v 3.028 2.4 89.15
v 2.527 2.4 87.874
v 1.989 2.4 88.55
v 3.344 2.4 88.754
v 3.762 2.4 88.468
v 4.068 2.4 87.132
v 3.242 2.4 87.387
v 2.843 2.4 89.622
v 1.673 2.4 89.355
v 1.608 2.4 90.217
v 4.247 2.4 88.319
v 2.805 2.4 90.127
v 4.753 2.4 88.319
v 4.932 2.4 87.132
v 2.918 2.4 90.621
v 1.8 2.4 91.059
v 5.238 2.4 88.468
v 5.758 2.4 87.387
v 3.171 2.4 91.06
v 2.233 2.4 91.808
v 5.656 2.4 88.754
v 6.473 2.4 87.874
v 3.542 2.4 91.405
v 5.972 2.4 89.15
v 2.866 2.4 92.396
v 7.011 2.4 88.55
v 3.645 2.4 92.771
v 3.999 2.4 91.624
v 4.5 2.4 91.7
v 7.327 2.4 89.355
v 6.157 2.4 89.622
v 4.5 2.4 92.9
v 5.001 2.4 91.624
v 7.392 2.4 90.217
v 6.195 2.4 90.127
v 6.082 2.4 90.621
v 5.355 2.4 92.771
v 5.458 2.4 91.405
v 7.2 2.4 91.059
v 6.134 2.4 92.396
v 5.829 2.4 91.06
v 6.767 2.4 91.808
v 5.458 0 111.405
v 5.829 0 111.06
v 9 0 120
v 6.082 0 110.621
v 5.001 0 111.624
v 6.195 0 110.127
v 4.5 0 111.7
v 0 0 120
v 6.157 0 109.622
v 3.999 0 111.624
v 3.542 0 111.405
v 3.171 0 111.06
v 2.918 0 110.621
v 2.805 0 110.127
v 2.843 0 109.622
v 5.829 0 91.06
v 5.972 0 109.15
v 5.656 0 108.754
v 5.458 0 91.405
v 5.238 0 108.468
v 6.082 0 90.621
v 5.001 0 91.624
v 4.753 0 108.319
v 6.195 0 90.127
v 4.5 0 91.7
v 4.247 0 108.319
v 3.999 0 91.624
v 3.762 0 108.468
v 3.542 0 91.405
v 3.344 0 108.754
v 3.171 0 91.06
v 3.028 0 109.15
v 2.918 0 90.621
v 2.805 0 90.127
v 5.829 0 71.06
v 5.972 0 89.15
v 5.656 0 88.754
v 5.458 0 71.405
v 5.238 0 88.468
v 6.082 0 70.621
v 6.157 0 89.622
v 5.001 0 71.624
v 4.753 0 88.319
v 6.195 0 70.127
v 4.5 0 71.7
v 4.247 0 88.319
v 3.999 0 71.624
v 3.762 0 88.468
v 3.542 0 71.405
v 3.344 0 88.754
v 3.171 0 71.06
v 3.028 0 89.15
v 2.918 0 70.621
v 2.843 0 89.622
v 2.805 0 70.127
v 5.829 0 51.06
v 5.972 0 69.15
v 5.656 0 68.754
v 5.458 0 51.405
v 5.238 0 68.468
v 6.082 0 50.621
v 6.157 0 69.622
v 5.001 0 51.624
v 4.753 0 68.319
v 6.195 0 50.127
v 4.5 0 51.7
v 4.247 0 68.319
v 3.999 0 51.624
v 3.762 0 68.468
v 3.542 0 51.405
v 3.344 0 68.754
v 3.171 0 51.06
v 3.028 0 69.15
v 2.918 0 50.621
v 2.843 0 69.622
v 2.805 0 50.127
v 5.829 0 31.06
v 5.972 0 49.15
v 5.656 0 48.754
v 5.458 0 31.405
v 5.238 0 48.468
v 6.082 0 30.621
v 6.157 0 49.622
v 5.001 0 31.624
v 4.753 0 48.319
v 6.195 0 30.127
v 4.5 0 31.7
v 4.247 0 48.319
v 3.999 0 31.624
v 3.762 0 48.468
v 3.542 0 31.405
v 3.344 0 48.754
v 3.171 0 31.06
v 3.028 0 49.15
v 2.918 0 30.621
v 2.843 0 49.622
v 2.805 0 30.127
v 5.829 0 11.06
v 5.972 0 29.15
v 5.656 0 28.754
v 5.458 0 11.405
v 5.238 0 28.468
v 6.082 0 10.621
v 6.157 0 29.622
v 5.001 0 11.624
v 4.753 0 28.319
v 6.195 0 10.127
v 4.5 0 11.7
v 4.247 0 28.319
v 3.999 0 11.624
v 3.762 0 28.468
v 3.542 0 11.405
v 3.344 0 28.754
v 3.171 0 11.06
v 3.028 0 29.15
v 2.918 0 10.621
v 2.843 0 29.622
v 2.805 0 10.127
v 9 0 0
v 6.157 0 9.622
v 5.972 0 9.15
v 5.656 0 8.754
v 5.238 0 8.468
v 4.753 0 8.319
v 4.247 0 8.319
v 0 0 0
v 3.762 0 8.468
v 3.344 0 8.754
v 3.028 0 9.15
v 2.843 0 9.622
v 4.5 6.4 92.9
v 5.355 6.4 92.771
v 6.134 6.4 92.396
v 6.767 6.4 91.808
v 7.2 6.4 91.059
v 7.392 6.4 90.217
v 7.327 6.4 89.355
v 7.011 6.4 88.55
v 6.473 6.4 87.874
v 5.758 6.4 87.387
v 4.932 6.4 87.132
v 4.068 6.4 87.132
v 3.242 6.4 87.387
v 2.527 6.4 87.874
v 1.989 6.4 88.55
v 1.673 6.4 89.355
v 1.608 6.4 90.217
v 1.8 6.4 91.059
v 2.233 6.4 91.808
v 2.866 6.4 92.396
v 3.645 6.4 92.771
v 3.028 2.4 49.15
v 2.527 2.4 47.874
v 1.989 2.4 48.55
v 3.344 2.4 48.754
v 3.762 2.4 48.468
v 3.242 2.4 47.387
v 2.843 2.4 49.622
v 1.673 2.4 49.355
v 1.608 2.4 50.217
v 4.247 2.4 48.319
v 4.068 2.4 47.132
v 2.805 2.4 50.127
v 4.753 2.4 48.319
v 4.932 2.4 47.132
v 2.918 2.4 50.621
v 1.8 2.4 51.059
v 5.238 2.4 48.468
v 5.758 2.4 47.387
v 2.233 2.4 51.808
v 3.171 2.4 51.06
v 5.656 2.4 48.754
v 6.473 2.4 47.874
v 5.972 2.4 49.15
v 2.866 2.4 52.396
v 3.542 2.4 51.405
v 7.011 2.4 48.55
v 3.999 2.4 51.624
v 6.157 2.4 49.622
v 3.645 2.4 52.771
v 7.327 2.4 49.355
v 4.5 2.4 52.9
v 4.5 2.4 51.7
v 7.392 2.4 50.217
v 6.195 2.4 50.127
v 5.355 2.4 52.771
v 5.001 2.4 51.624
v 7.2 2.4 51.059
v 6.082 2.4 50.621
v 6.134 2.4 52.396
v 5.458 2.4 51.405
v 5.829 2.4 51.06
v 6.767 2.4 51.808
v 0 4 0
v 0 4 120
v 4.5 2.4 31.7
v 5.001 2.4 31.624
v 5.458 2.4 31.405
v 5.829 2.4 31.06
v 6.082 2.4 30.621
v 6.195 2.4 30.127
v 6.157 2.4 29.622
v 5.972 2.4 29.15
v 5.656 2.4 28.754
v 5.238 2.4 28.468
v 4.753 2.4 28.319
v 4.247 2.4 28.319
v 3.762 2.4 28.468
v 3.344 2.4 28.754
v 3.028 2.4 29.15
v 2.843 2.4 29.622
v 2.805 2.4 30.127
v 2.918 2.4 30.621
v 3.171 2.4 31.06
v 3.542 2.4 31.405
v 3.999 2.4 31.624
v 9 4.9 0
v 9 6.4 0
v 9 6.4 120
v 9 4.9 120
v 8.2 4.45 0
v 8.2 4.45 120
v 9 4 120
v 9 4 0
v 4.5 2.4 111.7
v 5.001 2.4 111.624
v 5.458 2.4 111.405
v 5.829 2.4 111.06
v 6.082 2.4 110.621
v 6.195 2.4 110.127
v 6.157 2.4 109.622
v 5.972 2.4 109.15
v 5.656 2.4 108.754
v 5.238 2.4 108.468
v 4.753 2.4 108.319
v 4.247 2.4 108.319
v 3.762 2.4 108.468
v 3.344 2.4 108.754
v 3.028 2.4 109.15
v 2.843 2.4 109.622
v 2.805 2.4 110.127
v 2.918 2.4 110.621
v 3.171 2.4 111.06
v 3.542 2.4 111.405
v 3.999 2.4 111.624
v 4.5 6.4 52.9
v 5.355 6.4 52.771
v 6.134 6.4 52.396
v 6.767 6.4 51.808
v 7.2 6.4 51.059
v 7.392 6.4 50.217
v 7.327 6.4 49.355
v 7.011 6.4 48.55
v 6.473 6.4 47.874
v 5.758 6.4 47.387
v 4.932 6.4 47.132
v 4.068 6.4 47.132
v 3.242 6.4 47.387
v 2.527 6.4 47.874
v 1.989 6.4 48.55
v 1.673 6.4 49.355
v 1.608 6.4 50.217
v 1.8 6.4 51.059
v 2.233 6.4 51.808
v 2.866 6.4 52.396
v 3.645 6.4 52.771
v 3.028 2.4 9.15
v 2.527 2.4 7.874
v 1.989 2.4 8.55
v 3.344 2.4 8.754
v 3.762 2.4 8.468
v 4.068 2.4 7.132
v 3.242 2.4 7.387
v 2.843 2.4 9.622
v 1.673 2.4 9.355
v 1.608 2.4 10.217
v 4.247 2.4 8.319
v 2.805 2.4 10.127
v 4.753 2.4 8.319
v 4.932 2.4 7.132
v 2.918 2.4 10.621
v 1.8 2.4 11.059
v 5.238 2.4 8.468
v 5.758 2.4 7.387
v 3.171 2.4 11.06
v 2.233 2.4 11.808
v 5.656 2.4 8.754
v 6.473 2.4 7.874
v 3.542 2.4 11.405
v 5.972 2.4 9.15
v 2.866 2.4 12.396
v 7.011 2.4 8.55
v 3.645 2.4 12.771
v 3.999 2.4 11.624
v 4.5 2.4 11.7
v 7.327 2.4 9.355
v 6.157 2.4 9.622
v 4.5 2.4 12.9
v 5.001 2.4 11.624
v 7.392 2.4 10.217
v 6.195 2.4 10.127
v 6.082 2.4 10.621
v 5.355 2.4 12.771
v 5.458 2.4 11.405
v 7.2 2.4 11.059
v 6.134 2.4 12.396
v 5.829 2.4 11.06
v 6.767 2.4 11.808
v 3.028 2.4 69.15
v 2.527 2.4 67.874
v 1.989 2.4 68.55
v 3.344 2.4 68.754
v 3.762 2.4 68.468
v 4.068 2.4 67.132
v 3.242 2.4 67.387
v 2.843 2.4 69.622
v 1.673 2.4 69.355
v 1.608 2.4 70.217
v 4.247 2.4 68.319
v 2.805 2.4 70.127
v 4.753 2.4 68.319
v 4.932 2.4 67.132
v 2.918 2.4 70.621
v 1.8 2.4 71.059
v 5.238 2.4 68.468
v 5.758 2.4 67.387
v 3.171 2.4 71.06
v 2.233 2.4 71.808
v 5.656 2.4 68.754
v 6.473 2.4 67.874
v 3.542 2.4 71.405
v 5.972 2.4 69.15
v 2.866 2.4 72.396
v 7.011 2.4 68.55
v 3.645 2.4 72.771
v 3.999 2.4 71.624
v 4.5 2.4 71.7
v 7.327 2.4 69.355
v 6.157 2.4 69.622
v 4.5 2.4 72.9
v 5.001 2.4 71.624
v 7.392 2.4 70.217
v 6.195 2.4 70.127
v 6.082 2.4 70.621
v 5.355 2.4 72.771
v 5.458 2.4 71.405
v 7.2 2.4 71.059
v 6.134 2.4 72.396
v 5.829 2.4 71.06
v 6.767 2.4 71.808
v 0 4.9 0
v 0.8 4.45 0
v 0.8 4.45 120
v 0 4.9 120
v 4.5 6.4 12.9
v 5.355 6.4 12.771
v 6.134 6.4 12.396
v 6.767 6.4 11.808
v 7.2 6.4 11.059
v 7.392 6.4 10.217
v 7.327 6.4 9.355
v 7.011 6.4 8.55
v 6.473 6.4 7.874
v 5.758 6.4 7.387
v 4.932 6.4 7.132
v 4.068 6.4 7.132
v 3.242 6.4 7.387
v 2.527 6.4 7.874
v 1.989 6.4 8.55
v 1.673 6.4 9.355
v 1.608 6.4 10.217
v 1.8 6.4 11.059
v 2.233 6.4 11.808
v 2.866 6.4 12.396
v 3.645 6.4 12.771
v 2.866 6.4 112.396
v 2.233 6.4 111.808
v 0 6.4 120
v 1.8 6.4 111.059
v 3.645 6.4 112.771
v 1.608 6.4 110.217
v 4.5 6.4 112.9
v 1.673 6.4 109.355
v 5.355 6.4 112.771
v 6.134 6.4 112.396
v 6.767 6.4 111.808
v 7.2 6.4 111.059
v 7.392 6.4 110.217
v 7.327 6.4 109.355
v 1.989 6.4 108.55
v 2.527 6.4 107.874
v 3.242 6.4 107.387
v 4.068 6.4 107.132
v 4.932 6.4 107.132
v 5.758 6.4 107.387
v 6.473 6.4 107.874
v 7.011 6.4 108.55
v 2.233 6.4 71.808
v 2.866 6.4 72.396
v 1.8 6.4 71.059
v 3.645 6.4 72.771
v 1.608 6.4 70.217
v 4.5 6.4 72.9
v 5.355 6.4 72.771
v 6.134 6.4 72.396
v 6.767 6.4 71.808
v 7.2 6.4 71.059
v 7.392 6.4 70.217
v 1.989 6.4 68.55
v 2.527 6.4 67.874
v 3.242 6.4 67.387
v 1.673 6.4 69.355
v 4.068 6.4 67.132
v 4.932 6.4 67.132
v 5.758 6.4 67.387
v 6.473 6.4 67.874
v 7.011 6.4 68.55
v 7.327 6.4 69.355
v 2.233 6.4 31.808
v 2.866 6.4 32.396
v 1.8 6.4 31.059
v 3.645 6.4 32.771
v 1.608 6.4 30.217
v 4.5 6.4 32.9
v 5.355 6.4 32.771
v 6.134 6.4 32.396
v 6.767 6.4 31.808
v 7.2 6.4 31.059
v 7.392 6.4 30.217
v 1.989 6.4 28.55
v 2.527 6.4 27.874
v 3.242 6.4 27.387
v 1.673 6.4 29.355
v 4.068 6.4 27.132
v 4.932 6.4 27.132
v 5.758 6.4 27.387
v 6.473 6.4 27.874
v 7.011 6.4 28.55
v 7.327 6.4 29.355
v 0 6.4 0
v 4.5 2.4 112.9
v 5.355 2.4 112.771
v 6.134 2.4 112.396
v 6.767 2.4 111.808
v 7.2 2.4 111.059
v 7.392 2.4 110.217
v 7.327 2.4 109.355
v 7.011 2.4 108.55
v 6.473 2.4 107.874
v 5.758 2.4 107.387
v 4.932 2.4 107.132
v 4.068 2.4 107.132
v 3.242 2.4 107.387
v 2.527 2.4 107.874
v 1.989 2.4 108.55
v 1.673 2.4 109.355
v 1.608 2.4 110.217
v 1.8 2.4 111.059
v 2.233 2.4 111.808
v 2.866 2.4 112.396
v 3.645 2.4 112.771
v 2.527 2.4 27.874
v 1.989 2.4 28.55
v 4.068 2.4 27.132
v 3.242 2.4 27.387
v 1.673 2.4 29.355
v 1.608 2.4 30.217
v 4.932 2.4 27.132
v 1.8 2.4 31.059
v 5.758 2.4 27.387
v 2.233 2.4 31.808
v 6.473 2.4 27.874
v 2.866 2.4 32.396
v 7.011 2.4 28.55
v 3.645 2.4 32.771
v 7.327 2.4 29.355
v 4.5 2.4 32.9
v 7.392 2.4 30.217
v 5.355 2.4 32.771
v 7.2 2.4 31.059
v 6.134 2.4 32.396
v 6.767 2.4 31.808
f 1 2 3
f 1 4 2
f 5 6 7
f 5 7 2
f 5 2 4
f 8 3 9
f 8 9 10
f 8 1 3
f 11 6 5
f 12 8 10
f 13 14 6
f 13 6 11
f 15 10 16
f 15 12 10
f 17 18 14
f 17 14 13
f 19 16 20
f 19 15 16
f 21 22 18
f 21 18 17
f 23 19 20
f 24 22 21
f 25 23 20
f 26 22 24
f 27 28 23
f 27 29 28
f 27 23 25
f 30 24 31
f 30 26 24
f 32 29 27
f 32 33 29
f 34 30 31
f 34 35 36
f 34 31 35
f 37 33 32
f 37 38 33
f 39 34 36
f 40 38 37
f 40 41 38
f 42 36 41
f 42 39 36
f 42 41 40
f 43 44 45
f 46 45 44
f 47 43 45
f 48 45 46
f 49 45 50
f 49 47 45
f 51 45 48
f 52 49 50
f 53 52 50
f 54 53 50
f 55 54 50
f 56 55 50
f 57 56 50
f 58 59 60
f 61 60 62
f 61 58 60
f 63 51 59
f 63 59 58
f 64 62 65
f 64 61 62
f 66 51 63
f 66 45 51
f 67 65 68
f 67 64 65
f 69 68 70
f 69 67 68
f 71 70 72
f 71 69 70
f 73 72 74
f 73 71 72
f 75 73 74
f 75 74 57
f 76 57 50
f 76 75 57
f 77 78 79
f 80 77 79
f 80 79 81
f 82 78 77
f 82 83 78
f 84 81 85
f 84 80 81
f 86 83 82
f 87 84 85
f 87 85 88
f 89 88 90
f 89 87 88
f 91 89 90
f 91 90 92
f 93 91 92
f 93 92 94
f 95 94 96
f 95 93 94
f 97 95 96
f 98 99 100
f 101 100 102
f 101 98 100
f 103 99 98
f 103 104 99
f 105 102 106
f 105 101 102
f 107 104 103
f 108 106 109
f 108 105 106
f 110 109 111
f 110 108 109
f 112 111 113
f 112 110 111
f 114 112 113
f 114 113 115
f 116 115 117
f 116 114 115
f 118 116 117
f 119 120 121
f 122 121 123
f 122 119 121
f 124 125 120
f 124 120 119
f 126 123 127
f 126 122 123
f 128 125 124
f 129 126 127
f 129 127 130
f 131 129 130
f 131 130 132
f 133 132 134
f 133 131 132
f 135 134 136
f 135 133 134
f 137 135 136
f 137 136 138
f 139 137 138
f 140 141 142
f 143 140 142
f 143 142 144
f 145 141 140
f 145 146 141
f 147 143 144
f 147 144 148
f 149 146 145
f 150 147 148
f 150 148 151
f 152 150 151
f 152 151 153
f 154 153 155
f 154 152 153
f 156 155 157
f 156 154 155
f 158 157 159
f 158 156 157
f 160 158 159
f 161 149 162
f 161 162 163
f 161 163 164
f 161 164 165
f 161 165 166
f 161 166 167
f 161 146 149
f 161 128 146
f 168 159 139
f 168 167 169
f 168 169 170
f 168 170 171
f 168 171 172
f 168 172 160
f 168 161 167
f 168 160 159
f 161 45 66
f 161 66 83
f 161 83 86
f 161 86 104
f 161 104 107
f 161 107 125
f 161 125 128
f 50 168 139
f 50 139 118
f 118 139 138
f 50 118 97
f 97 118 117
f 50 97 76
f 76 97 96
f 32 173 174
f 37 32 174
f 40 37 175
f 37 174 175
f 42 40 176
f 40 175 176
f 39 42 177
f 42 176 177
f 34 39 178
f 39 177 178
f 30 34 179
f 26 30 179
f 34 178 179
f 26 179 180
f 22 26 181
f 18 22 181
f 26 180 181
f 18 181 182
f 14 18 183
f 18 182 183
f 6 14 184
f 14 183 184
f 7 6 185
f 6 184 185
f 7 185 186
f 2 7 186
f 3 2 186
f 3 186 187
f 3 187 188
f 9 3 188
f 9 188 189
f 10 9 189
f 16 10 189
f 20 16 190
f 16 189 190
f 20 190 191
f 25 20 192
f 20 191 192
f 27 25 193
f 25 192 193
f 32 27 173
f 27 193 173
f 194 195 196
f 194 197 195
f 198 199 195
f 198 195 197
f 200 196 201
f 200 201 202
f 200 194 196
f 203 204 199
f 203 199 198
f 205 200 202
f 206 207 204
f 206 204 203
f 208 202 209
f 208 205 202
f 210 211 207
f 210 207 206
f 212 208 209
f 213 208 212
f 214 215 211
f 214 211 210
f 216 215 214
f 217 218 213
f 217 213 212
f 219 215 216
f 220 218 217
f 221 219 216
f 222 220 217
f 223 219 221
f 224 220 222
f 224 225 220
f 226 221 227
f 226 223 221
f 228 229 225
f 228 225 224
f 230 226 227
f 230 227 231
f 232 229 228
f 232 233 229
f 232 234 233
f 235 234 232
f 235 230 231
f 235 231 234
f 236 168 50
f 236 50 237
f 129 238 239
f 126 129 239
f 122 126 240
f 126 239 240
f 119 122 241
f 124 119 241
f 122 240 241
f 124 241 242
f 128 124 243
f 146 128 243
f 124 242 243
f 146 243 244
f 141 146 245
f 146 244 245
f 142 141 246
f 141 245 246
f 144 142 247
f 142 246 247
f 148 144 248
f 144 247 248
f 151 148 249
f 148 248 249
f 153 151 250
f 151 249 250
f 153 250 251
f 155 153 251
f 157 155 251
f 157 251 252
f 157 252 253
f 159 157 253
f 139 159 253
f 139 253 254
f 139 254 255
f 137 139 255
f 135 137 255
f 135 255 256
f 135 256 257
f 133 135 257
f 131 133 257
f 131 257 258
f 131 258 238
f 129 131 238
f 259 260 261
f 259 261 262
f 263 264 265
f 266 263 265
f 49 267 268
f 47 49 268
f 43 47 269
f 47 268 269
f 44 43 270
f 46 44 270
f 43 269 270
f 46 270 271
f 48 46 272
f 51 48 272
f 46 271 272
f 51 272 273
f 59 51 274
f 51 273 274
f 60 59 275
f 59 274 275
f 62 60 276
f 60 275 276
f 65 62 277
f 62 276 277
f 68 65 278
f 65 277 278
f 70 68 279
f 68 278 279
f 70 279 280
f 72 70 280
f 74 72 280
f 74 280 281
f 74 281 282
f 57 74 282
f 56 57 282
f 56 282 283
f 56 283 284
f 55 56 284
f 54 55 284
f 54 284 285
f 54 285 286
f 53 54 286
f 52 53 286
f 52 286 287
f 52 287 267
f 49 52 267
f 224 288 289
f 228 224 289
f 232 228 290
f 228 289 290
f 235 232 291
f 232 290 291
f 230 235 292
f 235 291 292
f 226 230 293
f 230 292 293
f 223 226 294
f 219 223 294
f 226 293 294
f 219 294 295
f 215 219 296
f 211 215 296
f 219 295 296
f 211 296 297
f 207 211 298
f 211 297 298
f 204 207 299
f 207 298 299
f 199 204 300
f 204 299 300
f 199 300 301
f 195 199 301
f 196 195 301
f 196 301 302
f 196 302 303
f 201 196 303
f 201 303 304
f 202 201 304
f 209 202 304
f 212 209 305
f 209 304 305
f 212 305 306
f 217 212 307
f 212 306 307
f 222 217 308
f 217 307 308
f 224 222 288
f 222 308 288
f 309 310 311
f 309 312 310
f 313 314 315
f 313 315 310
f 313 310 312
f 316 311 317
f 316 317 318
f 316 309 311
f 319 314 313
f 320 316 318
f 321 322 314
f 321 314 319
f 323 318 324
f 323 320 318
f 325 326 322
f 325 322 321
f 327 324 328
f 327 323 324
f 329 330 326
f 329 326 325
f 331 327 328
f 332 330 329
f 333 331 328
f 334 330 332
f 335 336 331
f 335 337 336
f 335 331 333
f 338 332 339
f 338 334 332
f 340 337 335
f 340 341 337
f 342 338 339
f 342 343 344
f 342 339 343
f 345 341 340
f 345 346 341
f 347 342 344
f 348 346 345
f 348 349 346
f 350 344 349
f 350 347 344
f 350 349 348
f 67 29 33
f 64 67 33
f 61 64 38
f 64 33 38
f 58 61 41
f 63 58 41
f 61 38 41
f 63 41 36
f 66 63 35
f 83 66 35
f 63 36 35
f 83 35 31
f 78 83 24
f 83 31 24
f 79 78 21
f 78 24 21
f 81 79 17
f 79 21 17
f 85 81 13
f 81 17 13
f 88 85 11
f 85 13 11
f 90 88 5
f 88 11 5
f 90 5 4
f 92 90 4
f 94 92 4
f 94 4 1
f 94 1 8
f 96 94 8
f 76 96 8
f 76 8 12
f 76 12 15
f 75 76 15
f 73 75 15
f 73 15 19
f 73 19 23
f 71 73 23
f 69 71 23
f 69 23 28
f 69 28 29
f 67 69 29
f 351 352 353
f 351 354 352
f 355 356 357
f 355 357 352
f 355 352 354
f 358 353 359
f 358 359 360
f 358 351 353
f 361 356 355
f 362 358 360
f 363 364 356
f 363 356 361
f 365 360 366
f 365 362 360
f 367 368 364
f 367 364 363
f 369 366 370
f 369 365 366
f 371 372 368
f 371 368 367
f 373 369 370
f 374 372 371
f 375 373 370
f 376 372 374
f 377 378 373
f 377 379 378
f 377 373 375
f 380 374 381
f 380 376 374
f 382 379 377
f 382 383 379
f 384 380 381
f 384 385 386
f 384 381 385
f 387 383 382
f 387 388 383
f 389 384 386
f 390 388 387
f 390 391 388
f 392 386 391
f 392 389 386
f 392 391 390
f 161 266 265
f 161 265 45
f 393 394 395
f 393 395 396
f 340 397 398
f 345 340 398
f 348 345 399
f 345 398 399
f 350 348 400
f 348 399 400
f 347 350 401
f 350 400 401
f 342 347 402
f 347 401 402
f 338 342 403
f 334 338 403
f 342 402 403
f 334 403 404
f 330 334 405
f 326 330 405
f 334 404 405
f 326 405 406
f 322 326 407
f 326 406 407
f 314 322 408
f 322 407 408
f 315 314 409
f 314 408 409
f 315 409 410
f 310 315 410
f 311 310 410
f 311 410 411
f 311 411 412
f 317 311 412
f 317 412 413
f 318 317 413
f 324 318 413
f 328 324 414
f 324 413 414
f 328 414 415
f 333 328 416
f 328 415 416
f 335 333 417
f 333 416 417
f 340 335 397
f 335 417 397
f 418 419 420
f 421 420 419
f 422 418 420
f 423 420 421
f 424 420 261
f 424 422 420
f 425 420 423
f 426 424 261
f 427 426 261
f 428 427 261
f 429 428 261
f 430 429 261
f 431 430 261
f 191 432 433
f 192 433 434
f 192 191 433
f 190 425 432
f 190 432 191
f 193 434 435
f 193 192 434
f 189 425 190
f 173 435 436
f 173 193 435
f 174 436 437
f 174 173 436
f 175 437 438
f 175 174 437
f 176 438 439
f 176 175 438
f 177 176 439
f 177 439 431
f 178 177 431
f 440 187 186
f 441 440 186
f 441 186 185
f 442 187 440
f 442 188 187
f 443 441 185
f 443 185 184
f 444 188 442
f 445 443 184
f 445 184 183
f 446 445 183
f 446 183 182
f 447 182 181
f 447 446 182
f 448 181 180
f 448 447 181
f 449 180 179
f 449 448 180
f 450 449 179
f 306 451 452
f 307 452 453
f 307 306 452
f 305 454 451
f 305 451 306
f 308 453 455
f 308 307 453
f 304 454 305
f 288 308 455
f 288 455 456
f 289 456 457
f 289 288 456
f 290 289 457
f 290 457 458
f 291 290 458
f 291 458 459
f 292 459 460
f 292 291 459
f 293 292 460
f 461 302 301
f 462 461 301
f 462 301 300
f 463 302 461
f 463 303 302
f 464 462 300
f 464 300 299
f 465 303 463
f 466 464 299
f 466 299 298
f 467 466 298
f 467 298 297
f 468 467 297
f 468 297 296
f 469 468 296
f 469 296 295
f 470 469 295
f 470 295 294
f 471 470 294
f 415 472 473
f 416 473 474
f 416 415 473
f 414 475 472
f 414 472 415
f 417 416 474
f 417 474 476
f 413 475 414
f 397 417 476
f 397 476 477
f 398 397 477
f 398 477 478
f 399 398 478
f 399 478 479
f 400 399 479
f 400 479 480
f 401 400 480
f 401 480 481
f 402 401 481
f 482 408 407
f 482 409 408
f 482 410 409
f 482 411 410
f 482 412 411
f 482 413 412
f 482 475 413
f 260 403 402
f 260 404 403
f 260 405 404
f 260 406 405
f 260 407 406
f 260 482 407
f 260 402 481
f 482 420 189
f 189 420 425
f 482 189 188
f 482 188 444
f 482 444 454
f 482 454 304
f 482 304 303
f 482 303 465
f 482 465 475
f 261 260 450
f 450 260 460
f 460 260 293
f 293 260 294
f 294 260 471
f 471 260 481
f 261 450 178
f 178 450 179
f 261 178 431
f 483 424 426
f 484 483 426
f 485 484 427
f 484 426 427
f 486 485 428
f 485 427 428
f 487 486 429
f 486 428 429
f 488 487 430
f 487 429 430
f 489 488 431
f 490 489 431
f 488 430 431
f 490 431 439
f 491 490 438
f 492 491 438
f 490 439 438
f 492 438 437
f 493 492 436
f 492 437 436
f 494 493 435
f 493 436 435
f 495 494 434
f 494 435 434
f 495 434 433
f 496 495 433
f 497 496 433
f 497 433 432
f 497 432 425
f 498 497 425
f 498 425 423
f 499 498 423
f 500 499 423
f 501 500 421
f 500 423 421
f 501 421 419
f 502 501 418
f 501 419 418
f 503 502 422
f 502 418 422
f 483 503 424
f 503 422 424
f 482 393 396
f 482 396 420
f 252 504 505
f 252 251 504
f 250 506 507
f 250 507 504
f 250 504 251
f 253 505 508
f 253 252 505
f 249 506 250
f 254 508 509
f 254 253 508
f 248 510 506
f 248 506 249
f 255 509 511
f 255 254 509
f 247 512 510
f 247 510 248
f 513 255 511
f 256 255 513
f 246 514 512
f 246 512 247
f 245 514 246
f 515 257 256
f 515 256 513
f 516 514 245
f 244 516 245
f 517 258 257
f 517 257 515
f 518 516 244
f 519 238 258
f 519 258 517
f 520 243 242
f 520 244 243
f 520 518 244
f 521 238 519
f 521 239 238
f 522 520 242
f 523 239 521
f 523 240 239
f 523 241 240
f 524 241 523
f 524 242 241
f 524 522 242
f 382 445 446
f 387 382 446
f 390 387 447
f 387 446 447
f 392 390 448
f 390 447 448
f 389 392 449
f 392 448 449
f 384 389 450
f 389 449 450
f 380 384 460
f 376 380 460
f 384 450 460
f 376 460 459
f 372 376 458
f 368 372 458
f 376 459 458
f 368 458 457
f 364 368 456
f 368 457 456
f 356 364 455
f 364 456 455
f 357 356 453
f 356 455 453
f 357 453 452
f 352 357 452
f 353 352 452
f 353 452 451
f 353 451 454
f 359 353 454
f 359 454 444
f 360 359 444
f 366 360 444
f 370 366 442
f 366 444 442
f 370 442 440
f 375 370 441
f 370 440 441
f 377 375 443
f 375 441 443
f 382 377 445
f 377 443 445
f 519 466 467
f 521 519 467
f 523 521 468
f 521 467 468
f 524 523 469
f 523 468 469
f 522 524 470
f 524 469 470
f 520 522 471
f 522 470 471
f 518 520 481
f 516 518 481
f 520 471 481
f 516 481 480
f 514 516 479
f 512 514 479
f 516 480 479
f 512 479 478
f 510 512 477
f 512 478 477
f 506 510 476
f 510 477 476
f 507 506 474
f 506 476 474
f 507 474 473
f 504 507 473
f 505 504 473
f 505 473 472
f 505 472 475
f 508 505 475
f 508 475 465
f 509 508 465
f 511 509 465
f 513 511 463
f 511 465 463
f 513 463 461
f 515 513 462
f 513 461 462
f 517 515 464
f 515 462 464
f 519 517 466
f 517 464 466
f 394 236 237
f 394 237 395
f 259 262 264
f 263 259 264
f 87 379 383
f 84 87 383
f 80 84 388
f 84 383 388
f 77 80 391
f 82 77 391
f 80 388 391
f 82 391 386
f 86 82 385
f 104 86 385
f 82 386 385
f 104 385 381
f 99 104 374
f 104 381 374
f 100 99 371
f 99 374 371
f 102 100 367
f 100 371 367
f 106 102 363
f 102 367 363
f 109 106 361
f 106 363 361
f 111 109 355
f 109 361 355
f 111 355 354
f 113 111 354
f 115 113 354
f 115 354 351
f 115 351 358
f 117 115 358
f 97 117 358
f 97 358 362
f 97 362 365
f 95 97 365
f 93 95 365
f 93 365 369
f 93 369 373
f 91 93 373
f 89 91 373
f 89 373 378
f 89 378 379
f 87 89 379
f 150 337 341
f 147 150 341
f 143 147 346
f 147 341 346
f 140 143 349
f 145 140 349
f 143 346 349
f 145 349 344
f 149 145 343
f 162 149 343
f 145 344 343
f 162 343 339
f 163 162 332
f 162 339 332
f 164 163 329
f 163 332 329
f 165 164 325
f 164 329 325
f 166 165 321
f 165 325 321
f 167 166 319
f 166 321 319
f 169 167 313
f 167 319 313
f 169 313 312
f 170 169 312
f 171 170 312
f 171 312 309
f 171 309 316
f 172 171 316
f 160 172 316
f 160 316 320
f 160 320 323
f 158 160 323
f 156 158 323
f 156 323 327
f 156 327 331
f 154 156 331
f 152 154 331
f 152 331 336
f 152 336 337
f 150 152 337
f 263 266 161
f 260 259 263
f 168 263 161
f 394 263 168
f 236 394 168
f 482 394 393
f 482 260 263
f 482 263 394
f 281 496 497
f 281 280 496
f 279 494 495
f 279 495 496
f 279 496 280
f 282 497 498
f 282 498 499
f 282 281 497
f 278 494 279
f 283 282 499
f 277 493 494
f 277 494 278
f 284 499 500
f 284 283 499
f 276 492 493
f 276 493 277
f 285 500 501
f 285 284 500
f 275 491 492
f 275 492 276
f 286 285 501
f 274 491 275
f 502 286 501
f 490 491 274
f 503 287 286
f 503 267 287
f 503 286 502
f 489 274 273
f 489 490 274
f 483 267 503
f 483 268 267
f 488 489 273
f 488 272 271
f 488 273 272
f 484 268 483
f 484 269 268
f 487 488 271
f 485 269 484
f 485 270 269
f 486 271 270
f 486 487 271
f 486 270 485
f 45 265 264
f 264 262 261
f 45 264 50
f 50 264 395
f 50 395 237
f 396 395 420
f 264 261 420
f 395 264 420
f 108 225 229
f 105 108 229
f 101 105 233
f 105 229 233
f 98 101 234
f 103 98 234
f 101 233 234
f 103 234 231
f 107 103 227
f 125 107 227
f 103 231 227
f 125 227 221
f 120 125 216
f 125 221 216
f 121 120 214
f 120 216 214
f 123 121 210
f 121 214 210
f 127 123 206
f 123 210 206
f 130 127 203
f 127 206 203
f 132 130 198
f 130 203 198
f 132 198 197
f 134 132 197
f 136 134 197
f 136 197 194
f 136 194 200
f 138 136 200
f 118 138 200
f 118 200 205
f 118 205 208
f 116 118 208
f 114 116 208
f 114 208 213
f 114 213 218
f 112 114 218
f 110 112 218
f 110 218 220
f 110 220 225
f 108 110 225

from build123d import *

# Parameters (mm, degrees)
BOSS_EXTRUDE1_DEPTH = 120
SKETCH2_R           = 2.9
CUT_EXTRUDE1_DEPTH  = 4
SKETCH3_R           = 1.7
CUT_EXTRUDE2_DEPTH  = 121.403488322


with BuildPart() as part:
    # Sketch1 → Boss-Extrude1 (new body)
    with BuildSketch(Plane.XY):
        Polygon((9, 6.4), (9, 4.9), (8.2, 4.45), (9, 4), (9, 0), (0, 0), (0, 4), (0.8, 4.45), (0, 4.9), (0, 6.4), align=None)
    extrude(amount=BOSS_EXTRUDE1_DEPTH)

    # Sketch2 → Cut-Extrude1 (cut)
    with BuildSketch(Plane(origin=(0, 6.4, 0), x_dir=(1, 0, 0), z_dir=(0, 1, 0))):
        with Locations(Location((4.5, -110, 0), (0, 0, 270))):
            Circle(SKETCH2_R)
        with Locations(Location((4.5, -90, 0), (0, 0, 270))):
            Circle(SKETCH2_R)
        with Locations(Location((4.5, -70, 0), (0, 0, 270))):
            Circle(SKETCH2_R)
        with Locations(Location((4.5, -50, 0), (0, 0, 270))):
            Circle(SKETCH2_R)
        with Locations(Location((4.5, -30, 0), (0, 0, 270))):
            Circle(SKETCH2_R)
        with Locations(Location((4.5, -10, 0), (0, 0, 270))):
            Circle(SKETCH2_R)
        with Locations((4.5, 10)):
            Circle(SKETCH2_R)
    extrude(amount=-CUT_EXTRUDE1_DEPTH, mode=Mode.SUBTRACT)

    # Sketch3 → Cut-Extrude2 (cut, through all)
    with BuildSketch(Plane(origin=(0, 2.4, 0), x_dir=(1, 0, 0), z_dir=(0, 1, 0))):
        with Locations(Location((4.5, -110, 0), (0, 0, 270))):
            Circle(SKETCH3_R)
        with Locations(Location((4.5, -90, 0), (0, 0, 270))):
            Circle(SKETCH3_R)
        with Locations(Location((4.5, -70, 0), (0, 0, 270))):
            Circle(SKETCH3_R)
        with Locations(Location((4.5, -50, 0), (0, 0, 270))):
            Circle(SKETCH3_R)
        with Locations(Location((4.5, -30, 0), (0, 0, 270))):
            Circle(SKETCH3_R)
        with Locations(Location((4.5, -10, 0), (0, 0, 270))):
            Circle(SKETCH3_R)
        with Locations((4.5, 10)):
            Circle(SKETCH3_R)
    extrude(amount=-CUT_EXTRUDE2_DEPTH, mode=Mode.SUBTRACT)


solid = part.part
